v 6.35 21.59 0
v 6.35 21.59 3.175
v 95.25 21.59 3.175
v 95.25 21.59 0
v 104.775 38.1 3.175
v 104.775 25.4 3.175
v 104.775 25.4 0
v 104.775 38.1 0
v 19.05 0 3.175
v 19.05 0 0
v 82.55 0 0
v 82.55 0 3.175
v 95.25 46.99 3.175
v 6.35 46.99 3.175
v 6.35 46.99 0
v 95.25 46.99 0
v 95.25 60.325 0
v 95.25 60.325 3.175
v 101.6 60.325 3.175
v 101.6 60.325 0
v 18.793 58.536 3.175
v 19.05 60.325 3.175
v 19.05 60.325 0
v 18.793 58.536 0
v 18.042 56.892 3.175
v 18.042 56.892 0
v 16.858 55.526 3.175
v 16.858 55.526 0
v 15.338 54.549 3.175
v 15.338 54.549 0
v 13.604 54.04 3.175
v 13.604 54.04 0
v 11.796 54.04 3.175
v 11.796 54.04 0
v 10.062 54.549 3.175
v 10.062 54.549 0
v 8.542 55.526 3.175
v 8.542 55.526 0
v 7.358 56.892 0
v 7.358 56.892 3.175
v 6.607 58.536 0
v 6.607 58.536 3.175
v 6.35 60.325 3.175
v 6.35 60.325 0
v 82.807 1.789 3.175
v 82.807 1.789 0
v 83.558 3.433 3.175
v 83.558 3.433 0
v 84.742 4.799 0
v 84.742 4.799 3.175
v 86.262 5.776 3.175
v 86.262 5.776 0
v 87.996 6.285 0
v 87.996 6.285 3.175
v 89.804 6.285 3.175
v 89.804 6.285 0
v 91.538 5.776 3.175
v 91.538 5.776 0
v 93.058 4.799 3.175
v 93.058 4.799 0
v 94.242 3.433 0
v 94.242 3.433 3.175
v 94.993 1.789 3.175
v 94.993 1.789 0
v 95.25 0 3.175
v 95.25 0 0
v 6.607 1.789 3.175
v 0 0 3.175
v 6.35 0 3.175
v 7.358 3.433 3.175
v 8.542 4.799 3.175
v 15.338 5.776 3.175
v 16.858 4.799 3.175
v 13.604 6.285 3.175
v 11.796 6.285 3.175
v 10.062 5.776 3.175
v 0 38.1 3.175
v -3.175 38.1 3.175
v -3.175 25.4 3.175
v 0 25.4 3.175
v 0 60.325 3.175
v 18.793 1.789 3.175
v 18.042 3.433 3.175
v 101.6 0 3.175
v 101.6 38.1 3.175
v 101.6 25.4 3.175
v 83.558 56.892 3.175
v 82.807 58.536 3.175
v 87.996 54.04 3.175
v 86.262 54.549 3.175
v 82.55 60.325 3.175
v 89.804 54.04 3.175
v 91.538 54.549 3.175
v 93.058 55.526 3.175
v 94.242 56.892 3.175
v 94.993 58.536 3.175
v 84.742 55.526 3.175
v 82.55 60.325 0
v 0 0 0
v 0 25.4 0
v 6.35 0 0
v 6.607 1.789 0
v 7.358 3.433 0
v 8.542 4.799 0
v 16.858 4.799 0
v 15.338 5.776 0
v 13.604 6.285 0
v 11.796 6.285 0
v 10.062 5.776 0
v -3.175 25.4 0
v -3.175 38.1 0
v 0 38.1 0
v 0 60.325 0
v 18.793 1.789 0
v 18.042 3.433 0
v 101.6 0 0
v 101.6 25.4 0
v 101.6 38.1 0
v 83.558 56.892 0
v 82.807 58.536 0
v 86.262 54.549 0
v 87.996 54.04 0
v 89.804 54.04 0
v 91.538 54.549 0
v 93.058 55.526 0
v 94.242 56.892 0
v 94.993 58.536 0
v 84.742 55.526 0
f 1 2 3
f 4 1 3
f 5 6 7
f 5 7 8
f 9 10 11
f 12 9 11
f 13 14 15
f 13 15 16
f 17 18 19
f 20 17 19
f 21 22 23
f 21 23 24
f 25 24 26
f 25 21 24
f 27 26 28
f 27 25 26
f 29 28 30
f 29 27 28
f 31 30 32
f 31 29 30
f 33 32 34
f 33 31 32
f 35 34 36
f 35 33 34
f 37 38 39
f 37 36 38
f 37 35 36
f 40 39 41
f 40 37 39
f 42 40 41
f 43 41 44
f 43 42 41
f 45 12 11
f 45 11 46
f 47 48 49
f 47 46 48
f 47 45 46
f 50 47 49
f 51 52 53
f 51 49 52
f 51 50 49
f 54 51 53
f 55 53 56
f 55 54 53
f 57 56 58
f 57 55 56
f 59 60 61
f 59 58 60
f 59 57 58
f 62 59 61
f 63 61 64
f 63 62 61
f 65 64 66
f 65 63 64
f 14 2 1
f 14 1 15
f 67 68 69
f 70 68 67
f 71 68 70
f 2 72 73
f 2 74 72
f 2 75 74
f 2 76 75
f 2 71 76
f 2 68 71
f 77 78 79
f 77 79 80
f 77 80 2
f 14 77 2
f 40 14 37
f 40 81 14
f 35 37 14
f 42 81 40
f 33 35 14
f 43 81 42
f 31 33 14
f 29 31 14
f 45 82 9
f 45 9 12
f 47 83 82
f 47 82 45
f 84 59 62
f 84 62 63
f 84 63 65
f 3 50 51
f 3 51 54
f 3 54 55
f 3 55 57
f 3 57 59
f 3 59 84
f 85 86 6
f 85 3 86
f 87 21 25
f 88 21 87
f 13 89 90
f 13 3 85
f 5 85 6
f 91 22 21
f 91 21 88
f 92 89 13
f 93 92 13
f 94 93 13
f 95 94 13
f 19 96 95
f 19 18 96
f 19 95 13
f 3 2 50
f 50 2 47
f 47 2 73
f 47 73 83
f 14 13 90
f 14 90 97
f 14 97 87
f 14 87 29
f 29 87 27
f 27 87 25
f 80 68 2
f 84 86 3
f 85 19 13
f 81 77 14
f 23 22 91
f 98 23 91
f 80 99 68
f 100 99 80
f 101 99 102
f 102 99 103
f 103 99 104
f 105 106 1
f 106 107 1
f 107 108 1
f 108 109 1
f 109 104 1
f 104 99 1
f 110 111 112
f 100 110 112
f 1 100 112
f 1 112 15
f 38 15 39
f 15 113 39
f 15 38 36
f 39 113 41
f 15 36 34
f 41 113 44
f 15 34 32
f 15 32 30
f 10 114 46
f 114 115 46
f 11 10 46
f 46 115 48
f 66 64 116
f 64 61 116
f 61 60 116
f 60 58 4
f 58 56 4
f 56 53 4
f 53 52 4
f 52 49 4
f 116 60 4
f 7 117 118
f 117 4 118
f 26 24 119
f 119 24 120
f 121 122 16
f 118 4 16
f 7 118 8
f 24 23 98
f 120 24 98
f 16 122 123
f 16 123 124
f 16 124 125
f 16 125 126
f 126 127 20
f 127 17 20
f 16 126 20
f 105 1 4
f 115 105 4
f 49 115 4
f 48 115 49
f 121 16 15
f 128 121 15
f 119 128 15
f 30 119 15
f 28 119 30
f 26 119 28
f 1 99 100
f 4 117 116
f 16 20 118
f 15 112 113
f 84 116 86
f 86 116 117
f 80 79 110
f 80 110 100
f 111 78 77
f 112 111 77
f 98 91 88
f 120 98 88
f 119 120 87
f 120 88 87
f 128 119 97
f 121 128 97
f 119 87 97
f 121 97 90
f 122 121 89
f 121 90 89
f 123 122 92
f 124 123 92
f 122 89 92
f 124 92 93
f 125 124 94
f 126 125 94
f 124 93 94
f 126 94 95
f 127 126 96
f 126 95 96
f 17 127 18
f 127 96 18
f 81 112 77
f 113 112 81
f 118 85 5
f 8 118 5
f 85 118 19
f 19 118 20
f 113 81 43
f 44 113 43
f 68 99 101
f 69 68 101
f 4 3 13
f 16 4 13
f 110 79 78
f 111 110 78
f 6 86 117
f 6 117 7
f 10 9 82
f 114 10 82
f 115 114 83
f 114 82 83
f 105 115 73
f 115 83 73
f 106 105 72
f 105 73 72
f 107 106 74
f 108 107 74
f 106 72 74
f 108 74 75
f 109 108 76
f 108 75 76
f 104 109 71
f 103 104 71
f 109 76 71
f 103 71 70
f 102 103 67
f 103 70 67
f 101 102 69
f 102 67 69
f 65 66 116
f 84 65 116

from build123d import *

# Parameters (mm, degrees)
SKETCH1_W           = 101.6
SKETCH1_H           = 63.5
BOSS_EXTRUDE1_DEPTH = 3.175
SKETCH2_W           = 88.9
SKETCH2_H           = 25.4
CUT_EXTRUDE1_DEPTH  = 4.175
SKETCH3_W           = 3.175
SKETCH3_H           = 12.7
BOSS_EXTRUDE2_DEPTH = 3.175
SKETCH4_W           = 101.6
SKETCH4_H           = 3.175
CUT_EXTRUDE2_DEPTH  = 4.175
CUT_EXTRUDE5_DEPTH  = 4.175


with BuildPart() as part:
    # Sketch1 → Boss-Extrude1 (new body)
    with BuildSketch(Plane.XY):
        with Locations((50.8, 31.75)):
            Rectangle(SKETCH1_W, SKETCH1_H)
    extrude(amount=BOSS_EXTRUDE1_DEPTH)

    # Sketch2 → Cut-Extrude1 (cut, through all)
    with BuildSketch(Plane.XY.offset(3.175)):
        with Locations((50.8, 34.29)):
            Rectangle(SKETCH2_W, SKETCH2_H)
    extrude(amount=-CUT_EXTRUDE1_DEPTH, mode=Mode.SUBTRACT)

    # Sketch3 → Boss-Extrude2 (add)
    with BuildSketch(Plane.XY.offset(3.175)):
        with Locations((-1.5875, 31.75)):
            Rectangle(SKETCH3_W, SKETCH3_H)
        with Locations((103.1875, 31.75)):
            Rectangle(SKETCH3_W, SKETCH3_H)
    extrude(amount=-BOSS_EXTRUDE2_DEPTH)

    # Sketch4 → Cut-Extrude2 (cut, through all)
    with BuildSketch(Plane.XY.offset(3.175)):
        with Locations((50.8, 61.9125)):
            Rectangle(SKETCH4_W, SKETCH4_H)
    extrude(amount=-CUT_EXTRUDE2_DEPTH, mode=Mode.SUBTRACT)

    # Sketch7 → Cut-Extrude5 (cut, through all)
    with BuildSketch(Plane.XY.offset(3.175)):
        with BuildLine():
            Line((6.35, 0), (19.05, 0))
            ThreePointArc((19.05, 0), (12.7, 6.35), (6.35, 0))
        make_face()
        with BuildLine():
            Line((95.25, 0), (82.55, 0))
            ThreePointArc((82.55, 0), (88.9, 6.35), (95.25, 0))
        make_face()
        with BuildLine():
            Line((6.35, 60.325), (19.05, 60.325))
            ThreePointArc((19.05, 60.325), (12.7, 53.975), (6.35, 60.325))
        make_face()
        with BuildLine():
            Line((95.25, 60.325), (82.55, 60.325))
            ThreePointArc((82.55, 60.325), (88.9, 53.975), (95.25, 60.325))
        make_face()
    extrude(amount=-CUT_EXTRUDE5_DEPTH, mode=Mode.SUBTRACT)


solid = part.part
